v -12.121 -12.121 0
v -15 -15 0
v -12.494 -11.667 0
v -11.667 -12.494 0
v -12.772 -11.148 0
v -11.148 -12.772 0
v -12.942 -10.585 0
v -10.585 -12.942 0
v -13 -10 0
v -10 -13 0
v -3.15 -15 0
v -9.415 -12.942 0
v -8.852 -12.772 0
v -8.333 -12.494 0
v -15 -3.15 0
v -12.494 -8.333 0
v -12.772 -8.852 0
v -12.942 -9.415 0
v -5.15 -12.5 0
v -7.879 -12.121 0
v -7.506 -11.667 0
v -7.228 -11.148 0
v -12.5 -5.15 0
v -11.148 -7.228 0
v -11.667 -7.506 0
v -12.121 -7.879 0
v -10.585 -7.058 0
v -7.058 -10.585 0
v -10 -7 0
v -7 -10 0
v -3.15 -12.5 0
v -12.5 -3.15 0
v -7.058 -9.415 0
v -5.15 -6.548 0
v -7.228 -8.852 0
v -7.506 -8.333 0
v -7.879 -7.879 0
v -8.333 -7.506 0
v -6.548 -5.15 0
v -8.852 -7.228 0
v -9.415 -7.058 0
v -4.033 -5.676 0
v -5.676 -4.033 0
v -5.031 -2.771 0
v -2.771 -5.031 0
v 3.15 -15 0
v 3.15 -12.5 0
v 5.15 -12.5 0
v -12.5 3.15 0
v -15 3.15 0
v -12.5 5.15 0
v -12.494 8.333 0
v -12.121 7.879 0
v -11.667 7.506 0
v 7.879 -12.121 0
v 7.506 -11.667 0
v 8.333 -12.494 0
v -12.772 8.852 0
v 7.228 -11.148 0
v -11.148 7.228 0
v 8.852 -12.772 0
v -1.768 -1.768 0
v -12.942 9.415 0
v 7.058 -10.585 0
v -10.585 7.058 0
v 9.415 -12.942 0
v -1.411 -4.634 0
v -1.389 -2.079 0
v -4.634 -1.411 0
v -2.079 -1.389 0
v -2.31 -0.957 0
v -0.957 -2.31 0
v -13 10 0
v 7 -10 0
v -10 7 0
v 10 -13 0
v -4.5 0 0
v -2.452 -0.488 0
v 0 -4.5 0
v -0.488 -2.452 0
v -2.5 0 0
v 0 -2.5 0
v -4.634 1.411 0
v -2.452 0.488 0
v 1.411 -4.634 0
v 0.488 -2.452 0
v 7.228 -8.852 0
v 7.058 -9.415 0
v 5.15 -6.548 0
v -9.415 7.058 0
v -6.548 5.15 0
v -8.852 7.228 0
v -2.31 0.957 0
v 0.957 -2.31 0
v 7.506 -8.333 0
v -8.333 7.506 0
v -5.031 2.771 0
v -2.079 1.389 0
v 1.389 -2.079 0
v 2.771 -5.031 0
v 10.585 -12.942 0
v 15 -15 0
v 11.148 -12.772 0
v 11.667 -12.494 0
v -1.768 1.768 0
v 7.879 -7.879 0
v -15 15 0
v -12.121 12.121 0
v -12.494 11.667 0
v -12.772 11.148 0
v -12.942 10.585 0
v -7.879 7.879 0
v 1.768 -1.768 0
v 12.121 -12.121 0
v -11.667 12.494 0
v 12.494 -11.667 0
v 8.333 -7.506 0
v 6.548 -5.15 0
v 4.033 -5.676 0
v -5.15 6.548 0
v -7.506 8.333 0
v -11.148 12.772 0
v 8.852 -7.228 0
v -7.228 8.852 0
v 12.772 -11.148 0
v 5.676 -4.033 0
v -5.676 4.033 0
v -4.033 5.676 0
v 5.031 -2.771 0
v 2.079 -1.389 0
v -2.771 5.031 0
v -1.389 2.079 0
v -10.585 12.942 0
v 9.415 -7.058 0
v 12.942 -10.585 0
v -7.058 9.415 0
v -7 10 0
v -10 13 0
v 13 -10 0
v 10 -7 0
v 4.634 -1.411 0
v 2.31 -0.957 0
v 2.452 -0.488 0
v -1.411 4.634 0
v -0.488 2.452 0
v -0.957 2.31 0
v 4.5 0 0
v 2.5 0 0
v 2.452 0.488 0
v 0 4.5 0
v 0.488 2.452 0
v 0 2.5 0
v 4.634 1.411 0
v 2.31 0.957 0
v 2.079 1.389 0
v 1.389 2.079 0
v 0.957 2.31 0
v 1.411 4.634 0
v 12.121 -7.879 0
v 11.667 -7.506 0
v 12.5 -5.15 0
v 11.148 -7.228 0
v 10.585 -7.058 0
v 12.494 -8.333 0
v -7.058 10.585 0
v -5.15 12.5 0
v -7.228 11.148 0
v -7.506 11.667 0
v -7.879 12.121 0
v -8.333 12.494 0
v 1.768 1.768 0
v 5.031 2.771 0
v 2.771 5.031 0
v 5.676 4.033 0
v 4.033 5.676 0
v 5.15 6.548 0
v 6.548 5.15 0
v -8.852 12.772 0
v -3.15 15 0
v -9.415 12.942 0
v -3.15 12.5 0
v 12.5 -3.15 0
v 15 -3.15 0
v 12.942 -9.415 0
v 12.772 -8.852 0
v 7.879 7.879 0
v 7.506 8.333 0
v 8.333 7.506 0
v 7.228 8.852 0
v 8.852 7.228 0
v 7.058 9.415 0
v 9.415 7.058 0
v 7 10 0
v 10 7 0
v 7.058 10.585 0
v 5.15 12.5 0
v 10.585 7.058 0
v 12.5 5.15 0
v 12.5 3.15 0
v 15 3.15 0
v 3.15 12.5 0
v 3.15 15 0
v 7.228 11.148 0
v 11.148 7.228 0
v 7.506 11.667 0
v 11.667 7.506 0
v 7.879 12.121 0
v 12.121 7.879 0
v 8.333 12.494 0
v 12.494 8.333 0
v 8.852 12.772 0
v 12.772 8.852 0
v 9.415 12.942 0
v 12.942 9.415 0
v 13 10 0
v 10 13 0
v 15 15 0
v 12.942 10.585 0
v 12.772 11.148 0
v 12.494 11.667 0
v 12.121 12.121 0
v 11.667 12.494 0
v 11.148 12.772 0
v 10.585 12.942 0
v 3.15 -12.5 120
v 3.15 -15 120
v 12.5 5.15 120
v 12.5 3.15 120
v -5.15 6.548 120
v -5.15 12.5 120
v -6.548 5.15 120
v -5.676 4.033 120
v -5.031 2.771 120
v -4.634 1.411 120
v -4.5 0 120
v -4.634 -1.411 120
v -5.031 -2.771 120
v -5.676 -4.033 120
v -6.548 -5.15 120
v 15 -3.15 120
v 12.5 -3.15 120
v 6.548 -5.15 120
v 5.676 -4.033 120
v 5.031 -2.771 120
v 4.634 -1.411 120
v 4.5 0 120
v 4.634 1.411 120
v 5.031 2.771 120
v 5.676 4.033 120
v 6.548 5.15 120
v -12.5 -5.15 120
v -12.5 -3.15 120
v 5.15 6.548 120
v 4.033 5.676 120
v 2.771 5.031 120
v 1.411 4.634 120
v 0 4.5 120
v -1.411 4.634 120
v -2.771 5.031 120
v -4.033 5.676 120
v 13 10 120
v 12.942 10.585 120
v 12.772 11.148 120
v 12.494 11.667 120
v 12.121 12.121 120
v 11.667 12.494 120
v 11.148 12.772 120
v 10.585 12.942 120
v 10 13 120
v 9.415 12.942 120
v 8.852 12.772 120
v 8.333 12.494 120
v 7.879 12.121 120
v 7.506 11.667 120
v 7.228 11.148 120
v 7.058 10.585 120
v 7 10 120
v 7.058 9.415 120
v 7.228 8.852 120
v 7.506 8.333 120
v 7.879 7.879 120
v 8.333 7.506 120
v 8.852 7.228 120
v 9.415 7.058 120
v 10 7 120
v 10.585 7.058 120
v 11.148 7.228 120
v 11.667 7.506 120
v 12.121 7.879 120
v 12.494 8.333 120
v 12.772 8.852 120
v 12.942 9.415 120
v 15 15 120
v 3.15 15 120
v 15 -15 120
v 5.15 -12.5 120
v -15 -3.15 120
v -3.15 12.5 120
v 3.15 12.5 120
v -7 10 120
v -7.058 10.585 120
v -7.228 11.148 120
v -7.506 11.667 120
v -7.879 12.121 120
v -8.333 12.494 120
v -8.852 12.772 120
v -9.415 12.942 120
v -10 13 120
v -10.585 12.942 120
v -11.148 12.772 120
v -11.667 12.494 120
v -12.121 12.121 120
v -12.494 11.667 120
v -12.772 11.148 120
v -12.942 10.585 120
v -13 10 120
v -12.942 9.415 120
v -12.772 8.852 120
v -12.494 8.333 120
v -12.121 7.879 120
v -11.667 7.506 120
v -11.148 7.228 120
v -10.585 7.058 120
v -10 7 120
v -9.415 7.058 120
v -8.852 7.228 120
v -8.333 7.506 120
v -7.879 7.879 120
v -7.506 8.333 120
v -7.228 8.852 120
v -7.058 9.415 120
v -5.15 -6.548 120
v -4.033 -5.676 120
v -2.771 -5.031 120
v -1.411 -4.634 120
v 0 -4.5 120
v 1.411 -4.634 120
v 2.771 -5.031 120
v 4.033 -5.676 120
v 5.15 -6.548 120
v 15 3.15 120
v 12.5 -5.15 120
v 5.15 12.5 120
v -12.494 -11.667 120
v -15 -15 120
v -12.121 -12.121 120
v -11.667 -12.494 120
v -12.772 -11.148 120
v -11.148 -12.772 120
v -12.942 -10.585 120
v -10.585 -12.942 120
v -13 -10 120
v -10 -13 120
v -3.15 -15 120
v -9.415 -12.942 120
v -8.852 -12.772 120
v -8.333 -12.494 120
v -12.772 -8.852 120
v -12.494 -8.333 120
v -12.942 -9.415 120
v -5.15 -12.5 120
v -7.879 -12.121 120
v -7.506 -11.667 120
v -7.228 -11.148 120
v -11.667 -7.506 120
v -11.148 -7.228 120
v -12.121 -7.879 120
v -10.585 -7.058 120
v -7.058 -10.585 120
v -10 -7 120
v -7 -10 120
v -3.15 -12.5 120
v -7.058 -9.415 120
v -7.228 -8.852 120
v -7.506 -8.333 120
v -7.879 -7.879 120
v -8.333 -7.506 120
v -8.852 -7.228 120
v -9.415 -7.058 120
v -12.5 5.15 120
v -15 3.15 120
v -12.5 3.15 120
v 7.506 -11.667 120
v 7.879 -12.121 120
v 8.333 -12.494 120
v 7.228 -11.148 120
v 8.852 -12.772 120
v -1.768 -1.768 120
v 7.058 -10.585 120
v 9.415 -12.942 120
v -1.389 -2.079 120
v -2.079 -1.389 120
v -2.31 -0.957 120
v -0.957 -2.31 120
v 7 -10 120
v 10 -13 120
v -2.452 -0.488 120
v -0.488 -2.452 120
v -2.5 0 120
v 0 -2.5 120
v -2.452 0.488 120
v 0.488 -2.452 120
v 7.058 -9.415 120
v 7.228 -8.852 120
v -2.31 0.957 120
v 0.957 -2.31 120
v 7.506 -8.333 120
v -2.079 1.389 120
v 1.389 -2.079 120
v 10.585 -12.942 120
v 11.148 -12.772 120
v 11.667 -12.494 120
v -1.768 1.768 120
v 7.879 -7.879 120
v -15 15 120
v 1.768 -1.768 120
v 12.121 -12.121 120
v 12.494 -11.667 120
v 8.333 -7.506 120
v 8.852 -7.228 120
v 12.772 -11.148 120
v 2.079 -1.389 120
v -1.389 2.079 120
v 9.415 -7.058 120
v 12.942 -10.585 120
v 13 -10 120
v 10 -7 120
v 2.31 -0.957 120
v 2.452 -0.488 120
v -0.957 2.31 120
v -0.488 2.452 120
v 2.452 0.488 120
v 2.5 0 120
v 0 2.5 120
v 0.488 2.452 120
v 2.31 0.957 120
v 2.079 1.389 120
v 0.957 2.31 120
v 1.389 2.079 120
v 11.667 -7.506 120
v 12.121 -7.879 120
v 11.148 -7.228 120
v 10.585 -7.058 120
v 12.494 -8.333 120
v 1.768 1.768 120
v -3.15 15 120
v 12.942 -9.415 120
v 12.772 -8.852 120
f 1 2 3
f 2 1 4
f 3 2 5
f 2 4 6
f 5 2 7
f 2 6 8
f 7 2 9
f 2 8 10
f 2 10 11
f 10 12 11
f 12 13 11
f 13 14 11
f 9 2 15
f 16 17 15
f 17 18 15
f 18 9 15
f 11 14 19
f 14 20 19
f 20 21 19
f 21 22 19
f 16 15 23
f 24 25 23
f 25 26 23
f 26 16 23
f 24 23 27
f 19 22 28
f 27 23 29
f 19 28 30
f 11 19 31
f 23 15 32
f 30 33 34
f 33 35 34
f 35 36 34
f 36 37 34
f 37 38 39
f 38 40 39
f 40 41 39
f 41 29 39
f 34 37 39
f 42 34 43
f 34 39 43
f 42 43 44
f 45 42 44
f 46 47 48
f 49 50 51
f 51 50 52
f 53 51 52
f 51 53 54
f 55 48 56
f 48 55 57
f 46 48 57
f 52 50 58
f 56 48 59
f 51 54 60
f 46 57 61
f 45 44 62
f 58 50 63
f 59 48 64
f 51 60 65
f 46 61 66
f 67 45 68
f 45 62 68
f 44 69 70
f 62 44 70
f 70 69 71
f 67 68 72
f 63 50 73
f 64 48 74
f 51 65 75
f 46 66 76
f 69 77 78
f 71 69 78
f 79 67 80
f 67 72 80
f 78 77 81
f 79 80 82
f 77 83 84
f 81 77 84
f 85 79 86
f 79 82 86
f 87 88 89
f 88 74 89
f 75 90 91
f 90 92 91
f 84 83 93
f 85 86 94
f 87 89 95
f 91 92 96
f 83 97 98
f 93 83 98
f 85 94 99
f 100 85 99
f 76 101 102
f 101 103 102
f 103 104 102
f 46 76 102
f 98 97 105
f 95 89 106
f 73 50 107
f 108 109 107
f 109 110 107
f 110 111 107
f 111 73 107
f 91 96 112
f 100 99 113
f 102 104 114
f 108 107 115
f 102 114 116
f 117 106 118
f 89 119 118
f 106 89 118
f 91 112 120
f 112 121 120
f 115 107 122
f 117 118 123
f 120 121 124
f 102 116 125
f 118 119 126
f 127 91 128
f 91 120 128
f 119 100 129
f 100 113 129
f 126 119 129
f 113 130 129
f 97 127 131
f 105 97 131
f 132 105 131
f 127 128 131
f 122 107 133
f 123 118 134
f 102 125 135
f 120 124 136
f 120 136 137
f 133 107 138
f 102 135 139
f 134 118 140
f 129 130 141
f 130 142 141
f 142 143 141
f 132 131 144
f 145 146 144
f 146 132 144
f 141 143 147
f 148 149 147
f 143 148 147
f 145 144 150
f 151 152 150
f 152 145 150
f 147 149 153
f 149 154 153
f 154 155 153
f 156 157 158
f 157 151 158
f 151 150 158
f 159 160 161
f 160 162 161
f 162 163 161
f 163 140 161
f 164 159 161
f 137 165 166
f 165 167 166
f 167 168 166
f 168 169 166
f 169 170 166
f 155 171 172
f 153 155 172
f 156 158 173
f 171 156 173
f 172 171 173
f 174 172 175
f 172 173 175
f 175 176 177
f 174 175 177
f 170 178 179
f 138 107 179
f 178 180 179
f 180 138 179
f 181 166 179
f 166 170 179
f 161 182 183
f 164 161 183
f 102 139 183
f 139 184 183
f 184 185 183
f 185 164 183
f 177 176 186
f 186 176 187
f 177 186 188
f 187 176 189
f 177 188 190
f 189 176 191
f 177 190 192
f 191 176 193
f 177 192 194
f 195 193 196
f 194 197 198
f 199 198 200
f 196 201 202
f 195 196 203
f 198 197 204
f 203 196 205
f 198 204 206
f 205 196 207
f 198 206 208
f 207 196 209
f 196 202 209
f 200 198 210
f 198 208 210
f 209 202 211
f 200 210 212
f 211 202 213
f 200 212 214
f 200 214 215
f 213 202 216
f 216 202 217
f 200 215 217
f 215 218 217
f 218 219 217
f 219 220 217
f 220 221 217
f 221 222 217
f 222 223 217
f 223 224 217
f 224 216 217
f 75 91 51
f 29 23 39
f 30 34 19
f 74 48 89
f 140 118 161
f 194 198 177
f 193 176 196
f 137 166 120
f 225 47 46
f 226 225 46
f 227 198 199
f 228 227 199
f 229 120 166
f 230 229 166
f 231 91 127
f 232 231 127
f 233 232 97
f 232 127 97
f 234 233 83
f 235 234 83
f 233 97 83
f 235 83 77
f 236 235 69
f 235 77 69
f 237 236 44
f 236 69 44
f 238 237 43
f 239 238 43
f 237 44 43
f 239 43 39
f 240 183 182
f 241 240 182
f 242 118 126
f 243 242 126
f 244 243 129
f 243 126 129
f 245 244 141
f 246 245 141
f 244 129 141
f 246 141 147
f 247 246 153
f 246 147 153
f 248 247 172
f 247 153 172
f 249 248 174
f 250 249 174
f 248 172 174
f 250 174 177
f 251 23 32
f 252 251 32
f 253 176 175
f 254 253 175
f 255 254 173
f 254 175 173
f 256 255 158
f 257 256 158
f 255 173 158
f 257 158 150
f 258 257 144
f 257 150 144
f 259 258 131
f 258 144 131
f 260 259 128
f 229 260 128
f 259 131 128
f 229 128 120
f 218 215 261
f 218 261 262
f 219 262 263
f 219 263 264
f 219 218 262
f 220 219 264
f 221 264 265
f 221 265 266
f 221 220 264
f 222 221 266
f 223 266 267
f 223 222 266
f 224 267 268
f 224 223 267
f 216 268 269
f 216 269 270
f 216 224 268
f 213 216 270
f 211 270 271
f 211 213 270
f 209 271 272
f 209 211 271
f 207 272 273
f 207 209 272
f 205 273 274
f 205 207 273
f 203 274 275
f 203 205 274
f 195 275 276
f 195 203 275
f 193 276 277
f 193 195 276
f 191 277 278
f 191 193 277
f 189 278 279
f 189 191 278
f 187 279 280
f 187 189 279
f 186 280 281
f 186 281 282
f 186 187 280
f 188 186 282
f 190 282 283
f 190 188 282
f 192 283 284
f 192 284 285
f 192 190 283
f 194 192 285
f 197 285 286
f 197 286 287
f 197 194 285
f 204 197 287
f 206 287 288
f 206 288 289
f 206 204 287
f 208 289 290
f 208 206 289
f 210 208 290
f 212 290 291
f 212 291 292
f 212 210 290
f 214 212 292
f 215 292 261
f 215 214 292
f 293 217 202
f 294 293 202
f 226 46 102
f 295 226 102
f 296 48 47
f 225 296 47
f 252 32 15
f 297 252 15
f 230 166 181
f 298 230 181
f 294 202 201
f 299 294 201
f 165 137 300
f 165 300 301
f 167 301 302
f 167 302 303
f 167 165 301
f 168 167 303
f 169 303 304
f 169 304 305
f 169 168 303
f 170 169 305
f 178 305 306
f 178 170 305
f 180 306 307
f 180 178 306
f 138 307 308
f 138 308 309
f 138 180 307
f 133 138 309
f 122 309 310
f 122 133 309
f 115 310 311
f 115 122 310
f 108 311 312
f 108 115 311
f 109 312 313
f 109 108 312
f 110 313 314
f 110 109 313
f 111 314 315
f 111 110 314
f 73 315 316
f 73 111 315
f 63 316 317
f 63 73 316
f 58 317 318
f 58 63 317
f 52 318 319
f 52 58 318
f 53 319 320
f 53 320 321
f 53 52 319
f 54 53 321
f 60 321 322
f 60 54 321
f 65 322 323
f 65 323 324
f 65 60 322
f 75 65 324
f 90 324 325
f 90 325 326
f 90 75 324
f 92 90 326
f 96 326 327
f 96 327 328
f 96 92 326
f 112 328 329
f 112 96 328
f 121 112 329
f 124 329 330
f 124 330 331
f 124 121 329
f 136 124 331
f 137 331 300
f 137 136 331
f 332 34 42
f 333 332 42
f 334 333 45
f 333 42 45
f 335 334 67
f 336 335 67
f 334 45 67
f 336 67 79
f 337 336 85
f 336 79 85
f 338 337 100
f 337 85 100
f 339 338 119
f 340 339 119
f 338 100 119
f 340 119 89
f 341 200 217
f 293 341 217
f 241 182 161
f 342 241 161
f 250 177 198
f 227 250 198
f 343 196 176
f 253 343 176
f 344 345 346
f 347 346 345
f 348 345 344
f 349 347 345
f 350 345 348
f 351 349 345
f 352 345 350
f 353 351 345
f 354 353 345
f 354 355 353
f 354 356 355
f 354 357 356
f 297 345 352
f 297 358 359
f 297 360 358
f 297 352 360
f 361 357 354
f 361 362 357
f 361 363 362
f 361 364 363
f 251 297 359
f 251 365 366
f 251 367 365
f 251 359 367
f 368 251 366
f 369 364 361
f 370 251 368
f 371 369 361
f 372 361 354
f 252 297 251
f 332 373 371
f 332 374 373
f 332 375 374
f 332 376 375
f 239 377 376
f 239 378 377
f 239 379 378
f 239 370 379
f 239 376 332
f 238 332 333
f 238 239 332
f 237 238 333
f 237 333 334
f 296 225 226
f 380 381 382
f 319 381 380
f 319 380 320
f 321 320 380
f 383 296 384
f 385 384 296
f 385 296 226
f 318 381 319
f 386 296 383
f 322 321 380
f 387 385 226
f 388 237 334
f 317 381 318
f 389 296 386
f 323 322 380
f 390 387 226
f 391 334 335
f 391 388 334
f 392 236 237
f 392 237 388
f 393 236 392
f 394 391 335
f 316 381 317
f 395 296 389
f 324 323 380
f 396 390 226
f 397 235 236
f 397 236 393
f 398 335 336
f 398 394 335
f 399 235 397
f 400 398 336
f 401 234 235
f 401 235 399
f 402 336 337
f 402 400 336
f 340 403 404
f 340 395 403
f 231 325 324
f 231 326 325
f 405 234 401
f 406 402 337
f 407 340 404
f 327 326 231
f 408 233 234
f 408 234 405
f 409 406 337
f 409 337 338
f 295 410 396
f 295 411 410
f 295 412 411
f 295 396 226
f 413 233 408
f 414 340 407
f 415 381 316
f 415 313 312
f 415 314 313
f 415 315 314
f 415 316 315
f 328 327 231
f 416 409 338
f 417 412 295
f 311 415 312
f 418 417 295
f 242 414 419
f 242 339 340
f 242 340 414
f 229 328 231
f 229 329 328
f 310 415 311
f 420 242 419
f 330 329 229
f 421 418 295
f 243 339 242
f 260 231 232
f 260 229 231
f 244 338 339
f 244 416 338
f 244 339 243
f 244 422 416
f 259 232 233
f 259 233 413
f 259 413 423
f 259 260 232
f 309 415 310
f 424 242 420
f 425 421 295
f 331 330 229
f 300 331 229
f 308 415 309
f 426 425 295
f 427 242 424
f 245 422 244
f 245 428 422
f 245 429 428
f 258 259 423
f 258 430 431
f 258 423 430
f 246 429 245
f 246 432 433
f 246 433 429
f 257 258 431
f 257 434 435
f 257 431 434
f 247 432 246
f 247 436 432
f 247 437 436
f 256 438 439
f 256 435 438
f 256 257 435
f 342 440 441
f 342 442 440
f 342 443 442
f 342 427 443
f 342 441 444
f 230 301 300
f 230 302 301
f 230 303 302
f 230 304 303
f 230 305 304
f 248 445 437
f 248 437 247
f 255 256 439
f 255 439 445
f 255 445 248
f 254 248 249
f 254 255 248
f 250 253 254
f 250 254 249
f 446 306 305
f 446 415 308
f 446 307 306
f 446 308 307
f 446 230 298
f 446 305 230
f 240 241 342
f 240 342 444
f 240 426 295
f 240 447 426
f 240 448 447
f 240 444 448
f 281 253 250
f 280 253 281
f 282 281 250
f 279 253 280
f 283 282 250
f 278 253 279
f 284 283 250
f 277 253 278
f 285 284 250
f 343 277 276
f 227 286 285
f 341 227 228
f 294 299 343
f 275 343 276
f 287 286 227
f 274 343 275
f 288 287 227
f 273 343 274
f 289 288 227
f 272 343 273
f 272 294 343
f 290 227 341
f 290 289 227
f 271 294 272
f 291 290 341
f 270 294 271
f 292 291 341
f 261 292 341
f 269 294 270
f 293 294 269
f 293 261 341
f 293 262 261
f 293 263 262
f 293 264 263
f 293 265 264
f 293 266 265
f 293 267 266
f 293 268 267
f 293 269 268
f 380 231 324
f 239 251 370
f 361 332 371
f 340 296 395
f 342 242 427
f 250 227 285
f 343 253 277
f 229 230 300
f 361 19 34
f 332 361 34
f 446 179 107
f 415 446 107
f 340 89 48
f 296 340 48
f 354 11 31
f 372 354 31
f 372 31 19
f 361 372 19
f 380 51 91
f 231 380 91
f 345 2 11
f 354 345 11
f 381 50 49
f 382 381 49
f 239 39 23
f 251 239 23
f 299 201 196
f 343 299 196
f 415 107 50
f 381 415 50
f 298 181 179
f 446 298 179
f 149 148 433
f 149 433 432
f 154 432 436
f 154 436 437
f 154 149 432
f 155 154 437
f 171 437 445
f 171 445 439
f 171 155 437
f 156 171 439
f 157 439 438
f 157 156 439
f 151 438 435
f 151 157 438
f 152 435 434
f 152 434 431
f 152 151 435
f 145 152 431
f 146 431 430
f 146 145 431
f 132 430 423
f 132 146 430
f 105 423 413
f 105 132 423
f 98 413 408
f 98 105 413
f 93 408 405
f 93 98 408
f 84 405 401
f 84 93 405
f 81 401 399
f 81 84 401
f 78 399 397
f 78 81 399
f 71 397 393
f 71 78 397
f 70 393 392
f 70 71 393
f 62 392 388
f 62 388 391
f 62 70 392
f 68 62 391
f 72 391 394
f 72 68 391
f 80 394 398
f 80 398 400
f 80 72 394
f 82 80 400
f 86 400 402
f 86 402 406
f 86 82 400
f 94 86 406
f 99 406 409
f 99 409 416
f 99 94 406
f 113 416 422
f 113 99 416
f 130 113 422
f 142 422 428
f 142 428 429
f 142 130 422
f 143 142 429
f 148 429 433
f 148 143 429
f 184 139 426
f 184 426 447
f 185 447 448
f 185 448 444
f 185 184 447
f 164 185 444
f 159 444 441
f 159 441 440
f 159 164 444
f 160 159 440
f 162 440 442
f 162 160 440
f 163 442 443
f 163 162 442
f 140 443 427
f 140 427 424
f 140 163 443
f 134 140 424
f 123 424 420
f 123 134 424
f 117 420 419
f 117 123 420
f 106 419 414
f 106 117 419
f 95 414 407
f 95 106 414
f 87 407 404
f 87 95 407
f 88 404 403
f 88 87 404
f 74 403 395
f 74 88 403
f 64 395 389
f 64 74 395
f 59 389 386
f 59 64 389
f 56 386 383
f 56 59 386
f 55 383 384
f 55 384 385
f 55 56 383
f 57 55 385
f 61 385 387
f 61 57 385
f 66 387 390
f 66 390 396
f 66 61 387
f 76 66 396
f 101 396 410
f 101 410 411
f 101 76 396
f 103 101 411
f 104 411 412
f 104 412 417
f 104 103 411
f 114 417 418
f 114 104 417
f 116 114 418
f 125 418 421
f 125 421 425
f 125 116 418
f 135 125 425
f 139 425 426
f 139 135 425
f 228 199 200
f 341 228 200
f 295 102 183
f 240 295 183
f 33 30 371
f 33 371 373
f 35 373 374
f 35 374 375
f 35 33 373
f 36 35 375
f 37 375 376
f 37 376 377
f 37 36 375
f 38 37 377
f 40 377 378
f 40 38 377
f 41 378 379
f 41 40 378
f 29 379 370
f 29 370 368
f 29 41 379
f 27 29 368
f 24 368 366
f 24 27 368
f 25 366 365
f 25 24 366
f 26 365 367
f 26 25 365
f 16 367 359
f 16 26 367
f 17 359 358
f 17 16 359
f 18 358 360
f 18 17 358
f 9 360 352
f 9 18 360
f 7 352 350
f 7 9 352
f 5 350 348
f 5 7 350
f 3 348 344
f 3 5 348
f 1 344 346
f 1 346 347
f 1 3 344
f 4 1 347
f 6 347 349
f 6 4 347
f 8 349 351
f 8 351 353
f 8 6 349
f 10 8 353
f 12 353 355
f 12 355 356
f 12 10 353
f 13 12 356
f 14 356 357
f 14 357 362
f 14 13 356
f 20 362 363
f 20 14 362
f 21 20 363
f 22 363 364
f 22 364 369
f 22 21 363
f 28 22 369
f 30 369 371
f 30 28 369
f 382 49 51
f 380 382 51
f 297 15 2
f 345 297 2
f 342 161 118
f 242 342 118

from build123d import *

# Parameters (mm, degrees)
F0_R     = 3
F0_R_2   = 2.5
F1_DEPTH = 120


with BuildPart() as f1:
    # F0 (on Top) → F1 (new body)
    with BuildSketch(Plane.XY):
        with BuildLine():
            Line((-15, 15), (-15, 3.15))
            Line((-15, 3.15), (-12.5, 3.15))
            Line((-12.5, 3.15), (-12.5, 5.15))
            Line((-12.5, 5.15), (-6.547707, 5.15))
            ThreePointArc((-6.547707, 5.15), (-4.5, 0), (-6.547707, -5.15))
            Line((-6.547707, -5.15), (-12.5, -5.15))
            Line((-12.5, -5.15), (-12.5, -3.15))
            Line((-12.5, -3.15), (-15, -3.15))
            Line((-15, -3.15), (-15, -15))
            Line((-15, -15), (-3.15, -15))
            Line((-3.15, -15), (-3.15, -12.5))
            Line((-3.15, -12.5), (-5.15, -12.5))
            Line((-5.15, -12.5), (-5.15, -6.547707))
            ThreePointArc((-5.15, -6.547707), (0, -4.5), (5.15, -6.547707))
            Line((5.15, -6.547707), (5.15, -12.5))
            Line((5.15, -12.5), (3.15, -12.5))
            Line((3.15, -12.5), (3.15, -15))
            Line((3.15, -15), (15, -15))
            Line((15, -15), (15, -3.15))
            Line((15, -3.15), (12.5, -3.15))
            Line((12.5, -3.15), (12.5, -5.15))
            Line((12.5, -5.15), (6.547707, -5.15))
            ThreePointArc((6.547707, -5.15), (4.5, 0), (6.547707, 5.15))
            Line((6.547707, 5.15), (12.5, 5.15))
            Line((12.5, 5.15), (12.5, 3.15))
            Line((12.5, 3.15), (15, 3.15))
            Line((15, 3.15), (15, 15))
            Line((15, 15), (3.15, 15))
            Line((3.15, 15), (3.15, 12.5))
            Line((3.15, 12.5), (5.15, 12.5))
            Line((5.15, 12.5), (5.15, 6.547707))
            ThreePointArc((5.15, 6.547707), (0, 4.5), (-5.15, 6.547707))
            Line((-5.15, 6.547707), (-5.15, 12.5))
            Line((-5.15, 12.5), (-3.15, 12.5))
            Line((-3.15, 12.5), (-3.15, 15))
            Line((-3.15, 15), (-15, 15))
        make_face()
        with Locations((-10, -10)):
            Circle(F0_R, mode=Mode.SUBTRACT)
        with Locations((10, -10)):
            Circle(F0_R, mode=Mode.SUBTRACT)
        with Locations((-10, 10)):
            Circle(F0_R, mode=Mode.SUBTRACT)
        Circle(F0_R_2, mode=Mode.SUBTRACT)
        with Locations((10, 10)):
            Circle(F0_R, mode=Mode.SUBTRACT)
    extrude(amount=F1_DEPTH)


solid = f1.part
